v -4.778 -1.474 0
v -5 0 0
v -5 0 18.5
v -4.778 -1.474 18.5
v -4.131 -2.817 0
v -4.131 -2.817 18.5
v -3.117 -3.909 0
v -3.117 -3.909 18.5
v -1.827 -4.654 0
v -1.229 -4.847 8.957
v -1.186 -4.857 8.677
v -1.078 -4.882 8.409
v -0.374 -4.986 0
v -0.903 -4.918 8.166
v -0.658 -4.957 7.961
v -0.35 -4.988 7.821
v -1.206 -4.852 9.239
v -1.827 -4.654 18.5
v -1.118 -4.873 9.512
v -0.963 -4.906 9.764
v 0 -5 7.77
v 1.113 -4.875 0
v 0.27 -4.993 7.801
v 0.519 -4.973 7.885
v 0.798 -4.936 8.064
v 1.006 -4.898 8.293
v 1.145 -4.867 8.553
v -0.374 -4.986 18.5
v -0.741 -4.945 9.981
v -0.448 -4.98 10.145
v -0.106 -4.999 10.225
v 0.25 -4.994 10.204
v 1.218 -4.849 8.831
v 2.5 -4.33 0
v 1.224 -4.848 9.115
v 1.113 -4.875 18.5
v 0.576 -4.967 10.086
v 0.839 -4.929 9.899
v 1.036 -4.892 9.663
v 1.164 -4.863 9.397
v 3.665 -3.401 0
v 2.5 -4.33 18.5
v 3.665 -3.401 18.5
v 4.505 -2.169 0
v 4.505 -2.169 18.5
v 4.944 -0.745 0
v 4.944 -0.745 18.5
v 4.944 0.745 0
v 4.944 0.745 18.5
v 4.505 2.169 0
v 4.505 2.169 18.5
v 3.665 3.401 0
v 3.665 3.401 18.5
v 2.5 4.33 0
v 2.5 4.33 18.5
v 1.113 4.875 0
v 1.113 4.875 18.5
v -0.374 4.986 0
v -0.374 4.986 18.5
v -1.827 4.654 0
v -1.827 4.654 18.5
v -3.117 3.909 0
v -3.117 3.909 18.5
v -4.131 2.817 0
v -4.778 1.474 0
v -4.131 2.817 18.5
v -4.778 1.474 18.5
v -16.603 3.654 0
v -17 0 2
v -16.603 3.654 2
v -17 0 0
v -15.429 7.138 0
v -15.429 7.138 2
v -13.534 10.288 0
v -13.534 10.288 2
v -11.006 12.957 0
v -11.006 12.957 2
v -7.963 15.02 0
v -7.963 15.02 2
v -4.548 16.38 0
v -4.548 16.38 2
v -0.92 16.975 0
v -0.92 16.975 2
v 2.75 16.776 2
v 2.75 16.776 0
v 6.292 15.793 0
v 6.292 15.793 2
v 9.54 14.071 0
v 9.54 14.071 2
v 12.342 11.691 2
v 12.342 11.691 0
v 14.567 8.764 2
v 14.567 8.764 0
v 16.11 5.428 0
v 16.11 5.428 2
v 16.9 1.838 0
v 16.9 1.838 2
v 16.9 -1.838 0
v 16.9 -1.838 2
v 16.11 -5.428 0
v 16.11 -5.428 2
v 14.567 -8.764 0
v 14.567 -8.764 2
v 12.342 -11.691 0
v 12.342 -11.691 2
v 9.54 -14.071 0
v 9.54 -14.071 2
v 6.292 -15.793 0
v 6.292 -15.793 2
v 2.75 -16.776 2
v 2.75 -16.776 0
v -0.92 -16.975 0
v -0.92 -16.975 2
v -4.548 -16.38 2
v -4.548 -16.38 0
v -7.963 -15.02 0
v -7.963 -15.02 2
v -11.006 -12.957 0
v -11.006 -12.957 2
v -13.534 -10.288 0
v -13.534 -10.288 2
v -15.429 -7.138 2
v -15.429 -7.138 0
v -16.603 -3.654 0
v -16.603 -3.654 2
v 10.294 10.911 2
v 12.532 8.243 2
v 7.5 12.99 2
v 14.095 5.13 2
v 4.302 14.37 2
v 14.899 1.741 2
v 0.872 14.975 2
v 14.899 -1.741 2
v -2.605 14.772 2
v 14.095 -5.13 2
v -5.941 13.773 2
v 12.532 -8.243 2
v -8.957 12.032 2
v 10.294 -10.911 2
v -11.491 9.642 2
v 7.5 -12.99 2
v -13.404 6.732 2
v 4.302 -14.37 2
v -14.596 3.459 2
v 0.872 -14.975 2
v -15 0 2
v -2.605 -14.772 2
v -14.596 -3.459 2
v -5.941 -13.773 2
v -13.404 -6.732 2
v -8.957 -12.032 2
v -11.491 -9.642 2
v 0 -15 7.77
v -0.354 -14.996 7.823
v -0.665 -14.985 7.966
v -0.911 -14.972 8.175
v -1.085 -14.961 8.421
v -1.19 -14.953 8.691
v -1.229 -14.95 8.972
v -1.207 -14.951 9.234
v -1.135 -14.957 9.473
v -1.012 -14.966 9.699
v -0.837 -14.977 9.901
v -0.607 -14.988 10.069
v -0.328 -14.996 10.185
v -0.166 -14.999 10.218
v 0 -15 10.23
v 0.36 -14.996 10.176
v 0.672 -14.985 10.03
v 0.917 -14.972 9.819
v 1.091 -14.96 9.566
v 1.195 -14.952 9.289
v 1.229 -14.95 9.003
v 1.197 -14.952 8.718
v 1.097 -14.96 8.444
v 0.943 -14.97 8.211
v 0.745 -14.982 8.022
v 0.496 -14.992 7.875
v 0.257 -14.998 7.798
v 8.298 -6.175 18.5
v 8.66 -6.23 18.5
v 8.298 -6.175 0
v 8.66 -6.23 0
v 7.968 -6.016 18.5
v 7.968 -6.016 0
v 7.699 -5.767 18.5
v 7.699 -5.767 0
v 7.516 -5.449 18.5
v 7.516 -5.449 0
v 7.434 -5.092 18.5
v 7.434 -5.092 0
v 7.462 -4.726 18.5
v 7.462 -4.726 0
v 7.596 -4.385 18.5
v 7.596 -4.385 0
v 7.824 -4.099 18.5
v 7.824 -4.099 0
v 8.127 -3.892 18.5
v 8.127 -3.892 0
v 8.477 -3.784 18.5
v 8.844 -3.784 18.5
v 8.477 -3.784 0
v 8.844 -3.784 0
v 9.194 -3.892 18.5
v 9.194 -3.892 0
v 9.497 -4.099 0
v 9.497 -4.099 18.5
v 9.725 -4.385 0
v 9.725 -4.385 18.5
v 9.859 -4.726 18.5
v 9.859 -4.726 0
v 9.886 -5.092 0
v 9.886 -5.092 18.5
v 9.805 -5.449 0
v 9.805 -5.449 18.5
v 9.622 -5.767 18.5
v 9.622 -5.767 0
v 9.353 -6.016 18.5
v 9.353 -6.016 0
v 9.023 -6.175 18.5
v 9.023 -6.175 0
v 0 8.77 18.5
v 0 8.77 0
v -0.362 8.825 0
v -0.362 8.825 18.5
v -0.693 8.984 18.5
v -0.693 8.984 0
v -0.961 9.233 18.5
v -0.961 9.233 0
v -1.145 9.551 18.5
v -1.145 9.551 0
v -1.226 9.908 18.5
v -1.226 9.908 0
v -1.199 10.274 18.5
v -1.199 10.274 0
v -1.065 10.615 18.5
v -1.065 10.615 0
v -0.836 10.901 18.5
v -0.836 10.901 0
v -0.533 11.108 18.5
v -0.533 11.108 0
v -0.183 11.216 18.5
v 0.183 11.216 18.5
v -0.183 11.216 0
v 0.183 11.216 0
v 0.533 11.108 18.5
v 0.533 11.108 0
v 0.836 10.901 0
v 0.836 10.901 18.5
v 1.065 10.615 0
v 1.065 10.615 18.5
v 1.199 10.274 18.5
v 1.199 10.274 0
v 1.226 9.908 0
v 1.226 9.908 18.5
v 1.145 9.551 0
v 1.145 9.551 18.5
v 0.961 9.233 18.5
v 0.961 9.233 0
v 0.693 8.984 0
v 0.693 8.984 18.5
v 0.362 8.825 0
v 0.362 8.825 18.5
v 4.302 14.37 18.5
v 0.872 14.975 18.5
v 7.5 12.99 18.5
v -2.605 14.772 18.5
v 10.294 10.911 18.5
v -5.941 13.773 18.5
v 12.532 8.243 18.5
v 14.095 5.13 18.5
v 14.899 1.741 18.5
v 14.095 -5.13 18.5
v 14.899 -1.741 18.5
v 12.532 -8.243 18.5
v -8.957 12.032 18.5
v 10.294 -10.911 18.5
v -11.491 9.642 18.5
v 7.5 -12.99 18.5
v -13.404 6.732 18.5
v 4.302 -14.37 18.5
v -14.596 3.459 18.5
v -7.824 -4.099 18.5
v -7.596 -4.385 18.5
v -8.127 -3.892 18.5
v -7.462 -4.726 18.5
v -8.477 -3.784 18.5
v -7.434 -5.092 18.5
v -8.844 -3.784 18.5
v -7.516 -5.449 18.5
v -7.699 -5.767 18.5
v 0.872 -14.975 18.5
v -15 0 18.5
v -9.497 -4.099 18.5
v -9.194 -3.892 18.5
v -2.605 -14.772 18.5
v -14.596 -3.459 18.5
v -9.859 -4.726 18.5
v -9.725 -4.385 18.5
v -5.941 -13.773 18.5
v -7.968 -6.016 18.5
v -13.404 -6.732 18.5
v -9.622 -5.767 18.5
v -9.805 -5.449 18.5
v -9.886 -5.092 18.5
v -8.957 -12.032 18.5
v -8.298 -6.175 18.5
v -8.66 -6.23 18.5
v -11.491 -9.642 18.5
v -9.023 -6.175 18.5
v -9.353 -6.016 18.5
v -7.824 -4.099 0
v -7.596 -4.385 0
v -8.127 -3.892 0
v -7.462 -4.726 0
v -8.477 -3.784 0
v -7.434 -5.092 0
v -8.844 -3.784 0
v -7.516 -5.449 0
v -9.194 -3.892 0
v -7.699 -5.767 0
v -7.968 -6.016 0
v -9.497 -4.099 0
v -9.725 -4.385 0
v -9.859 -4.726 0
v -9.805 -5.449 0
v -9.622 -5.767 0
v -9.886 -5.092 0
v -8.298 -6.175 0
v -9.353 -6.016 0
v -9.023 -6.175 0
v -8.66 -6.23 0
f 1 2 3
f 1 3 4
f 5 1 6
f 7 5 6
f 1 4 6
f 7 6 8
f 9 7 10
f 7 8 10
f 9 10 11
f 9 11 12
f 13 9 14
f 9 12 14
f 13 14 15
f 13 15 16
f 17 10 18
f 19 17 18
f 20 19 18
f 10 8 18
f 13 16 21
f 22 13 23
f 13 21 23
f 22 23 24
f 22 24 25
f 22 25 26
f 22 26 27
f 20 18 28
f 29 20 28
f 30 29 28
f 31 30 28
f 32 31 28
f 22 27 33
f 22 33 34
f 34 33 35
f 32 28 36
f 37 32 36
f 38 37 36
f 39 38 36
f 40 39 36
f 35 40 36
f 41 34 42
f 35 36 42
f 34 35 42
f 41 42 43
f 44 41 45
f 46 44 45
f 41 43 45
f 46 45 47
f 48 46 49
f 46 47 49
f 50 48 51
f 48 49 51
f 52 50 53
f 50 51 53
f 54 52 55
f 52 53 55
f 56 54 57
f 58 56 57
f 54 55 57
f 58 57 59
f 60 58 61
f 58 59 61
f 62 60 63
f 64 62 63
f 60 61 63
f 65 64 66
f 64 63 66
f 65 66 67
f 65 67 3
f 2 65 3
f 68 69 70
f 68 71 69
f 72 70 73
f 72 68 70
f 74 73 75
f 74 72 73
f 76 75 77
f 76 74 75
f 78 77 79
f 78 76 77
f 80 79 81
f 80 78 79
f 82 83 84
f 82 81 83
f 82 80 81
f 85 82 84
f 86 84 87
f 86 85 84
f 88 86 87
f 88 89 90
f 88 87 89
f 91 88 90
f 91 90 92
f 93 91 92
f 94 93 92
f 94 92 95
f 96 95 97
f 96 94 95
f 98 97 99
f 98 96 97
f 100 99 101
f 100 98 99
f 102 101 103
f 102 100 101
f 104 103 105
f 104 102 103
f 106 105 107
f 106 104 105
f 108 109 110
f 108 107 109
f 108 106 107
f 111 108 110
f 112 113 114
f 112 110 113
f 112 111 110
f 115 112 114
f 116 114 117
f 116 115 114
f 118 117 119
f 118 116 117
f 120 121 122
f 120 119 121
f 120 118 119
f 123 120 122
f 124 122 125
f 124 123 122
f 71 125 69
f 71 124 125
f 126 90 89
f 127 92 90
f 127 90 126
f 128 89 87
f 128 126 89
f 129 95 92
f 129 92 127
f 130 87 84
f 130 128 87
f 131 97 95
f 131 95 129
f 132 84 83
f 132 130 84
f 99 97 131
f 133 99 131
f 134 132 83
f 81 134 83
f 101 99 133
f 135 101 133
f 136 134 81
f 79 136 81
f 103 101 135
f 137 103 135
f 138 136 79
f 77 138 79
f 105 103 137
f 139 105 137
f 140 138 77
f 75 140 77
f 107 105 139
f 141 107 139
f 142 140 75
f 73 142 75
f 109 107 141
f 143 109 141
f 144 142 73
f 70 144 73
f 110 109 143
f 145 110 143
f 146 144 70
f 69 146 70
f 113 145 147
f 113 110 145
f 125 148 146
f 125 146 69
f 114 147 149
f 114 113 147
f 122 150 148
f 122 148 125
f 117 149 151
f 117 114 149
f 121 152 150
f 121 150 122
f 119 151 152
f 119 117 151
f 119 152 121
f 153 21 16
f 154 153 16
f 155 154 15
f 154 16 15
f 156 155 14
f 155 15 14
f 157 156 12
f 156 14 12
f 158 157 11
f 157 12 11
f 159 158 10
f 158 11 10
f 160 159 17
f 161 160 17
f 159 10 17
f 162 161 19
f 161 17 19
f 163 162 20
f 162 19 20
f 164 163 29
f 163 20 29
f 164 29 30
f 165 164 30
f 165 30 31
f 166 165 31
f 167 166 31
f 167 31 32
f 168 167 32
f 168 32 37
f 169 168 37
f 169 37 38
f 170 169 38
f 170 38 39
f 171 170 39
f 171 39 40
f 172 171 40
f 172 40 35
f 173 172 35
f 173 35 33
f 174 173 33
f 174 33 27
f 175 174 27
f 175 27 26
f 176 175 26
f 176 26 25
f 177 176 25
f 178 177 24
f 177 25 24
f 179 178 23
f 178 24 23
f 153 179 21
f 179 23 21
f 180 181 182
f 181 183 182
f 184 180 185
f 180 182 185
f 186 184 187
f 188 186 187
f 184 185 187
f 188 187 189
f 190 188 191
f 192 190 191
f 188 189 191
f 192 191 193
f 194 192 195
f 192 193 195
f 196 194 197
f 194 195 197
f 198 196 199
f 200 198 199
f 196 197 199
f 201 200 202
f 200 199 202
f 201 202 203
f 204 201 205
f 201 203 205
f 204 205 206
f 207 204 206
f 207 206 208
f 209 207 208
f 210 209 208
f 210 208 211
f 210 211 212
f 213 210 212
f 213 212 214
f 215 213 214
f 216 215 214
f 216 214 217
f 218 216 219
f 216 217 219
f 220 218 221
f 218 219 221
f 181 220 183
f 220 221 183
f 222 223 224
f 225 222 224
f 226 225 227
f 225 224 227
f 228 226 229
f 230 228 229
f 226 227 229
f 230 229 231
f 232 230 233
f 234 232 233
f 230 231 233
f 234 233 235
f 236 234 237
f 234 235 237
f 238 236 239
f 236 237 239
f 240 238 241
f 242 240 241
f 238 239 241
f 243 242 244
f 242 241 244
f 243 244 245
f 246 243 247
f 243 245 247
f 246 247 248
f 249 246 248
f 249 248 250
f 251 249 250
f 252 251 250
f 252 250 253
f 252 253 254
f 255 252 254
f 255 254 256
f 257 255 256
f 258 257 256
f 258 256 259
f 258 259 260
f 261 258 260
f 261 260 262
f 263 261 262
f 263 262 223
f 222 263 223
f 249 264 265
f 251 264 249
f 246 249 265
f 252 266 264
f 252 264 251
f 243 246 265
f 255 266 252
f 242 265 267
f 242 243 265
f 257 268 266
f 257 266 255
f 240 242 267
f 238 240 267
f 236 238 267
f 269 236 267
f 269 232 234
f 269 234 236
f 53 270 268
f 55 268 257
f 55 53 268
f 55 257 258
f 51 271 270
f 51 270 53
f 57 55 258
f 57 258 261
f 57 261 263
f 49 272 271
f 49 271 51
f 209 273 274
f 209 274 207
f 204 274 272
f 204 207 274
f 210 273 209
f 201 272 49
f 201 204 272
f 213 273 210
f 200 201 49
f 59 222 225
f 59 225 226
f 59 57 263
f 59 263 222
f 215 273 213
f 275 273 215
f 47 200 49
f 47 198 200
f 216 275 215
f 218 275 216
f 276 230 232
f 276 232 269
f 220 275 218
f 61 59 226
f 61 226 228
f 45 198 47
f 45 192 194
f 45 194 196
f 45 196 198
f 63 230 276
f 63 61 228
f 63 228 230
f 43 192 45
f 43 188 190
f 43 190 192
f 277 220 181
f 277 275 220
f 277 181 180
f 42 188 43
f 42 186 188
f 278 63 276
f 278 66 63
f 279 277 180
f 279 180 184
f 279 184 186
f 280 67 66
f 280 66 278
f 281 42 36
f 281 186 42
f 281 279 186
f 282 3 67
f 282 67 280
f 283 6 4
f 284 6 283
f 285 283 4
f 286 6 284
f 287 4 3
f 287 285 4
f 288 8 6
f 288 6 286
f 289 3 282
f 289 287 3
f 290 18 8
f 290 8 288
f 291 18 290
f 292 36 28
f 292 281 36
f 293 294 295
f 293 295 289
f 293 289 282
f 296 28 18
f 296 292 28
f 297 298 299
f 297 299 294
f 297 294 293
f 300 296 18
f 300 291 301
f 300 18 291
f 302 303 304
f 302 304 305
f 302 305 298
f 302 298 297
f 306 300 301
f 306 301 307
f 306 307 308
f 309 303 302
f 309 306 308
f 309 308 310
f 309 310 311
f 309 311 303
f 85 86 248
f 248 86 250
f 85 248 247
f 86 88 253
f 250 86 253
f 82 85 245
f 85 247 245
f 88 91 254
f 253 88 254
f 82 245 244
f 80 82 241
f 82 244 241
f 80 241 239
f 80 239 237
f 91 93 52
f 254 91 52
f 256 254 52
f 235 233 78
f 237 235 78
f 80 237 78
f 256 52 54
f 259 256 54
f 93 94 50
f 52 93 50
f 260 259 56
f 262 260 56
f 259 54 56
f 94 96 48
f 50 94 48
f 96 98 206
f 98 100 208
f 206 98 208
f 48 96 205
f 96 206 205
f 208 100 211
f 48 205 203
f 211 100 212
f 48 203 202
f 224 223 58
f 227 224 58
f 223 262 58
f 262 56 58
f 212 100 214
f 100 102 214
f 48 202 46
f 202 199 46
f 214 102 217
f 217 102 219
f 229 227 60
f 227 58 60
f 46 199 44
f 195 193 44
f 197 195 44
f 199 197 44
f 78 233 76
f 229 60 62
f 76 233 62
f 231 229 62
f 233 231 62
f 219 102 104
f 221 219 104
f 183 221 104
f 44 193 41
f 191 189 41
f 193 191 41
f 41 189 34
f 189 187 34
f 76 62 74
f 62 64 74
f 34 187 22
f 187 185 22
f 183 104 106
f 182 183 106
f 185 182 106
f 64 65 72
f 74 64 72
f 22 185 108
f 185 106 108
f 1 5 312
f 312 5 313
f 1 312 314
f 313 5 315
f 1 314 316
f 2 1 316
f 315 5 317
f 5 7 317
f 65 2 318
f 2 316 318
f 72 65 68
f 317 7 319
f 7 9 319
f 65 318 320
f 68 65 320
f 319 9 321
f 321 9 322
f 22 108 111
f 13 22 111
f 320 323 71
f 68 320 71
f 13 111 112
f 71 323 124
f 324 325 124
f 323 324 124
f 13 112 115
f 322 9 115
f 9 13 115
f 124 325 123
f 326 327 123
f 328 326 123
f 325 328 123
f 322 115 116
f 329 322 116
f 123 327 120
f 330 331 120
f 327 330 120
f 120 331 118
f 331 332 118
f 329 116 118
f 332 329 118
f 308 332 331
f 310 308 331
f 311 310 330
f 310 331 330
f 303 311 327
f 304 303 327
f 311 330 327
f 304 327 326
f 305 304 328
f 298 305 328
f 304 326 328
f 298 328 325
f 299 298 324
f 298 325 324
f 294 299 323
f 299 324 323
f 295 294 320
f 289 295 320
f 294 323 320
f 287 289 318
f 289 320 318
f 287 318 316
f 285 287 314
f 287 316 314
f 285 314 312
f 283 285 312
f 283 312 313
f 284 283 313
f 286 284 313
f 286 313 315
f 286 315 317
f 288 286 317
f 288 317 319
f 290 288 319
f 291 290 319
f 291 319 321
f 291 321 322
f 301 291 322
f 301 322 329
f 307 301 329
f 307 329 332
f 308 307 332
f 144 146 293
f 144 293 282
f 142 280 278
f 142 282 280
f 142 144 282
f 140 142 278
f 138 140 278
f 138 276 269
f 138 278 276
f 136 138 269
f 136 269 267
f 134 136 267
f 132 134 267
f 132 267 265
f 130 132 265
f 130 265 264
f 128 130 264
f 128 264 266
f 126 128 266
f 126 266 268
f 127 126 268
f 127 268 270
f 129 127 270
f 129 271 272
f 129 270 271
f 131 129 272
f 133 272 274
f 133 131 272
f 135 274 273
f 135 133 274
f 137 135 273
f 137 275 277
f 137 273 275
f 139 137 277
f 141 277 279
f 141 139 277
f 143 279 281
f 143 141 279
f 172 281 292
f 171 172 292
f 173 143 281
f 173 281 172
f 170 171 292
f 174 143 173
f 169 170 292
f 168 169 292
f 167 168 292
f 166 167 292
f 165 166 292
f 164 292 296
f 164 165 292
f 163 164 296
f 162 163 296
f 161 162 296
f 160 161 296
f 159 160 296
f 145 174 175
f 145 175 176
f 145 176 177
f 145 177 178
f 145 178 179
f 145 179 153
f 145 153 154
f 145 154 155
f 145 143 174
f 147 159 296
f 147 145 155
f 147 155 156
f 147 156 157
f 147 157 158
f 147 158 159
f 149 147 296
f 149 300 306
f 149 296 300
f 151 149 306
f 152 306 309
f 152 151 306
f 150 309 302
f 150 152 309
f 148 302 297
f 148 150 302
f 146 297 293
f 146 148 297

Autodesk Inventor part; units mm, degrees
ref_plane "YZ Plane" through (0, 0, 0) normal (1, 0, 0) x (0, 1, 0)
ref_plane "XY Plane" through (0, 0, 0) normal (0, 0, 1) x (1, 0, 0)
sketch "Sketch1" plane through (0, 0, 0) normal (0, 1, 0) x (-1, 0, 0)
  line L0 (0, 0) -> (0, 34.0434)
  line L1 (5, 0) -> (5, 18.5)
  line L2 (5, 18.5) -> (15, 18.5)
  line L3 (15, 18.5) -> (15, 2)
  line L4 (15, 2) -> (17, 2)
  line L5 (17, 2) -> (17, 0)
  line L6 (17, 0) -> (5, 0)
  dimension "d0" = 10
  dimension "d1" = 2
  dimension "d2" = 2
  dimension "d3" = 30
  dimension "d4" = 16.5
revolve "Revolution1" add sketch "Sketch1" angle 360 about axis through (0, 0, 0) along (0, 0, 1)
sketch "Sketch2" plane through (0, 0, 18.5) normal (0, 0, 1) x (1, 0, 0)
  circle A0 centre (0, 0) radius 5 projected
  circle A1 centre (0, 0) radius 15 projected
  circle A2 centre (0, 0) radius 5 projected
  line L0 (0, 5) -> (0, 15)
  point P0 (0, 10)
  point P1 (0, 10)
  point P2 (-8.6603, -5)
  point P3 (8.6603, -5)
  dimension "d8" = 360
hole "Hole1" at (0, 10, 18.5) at (-8.6603, -5, 18.5) at (8.6603, -5, 18.5) direction (0, 0, -1) diameter 2.459 end through all thread size "M3x0.5" class "6H" standard "ISO Metric profile"
ref_plane "Work Plane2" through (0, -15, 10.25) normal (0, 1, 0) x (-1, 0, 0)
sketch "Sketch3" plane through (0, -15, 10.25) normal (0, 1, 0) x (-1, 0, 0)
  line L0 (17, -10.25) -> (-17, -10.25) projected
  point P0 (0, -10.25)
  point P1 (0, -1.25)
  point P2 (0, -10.25)
  dimension "d17" = 9
hole "Hole2" at (0, -15, 9) direction (0, 1, 0) diameter 2.459 depth 12 tip angle 118 thread size "M3x0.5" class "6H" standard "ISO Metric profile"
properties part number "ReelMotorBearingShaft" material "Aluminum 6061"
